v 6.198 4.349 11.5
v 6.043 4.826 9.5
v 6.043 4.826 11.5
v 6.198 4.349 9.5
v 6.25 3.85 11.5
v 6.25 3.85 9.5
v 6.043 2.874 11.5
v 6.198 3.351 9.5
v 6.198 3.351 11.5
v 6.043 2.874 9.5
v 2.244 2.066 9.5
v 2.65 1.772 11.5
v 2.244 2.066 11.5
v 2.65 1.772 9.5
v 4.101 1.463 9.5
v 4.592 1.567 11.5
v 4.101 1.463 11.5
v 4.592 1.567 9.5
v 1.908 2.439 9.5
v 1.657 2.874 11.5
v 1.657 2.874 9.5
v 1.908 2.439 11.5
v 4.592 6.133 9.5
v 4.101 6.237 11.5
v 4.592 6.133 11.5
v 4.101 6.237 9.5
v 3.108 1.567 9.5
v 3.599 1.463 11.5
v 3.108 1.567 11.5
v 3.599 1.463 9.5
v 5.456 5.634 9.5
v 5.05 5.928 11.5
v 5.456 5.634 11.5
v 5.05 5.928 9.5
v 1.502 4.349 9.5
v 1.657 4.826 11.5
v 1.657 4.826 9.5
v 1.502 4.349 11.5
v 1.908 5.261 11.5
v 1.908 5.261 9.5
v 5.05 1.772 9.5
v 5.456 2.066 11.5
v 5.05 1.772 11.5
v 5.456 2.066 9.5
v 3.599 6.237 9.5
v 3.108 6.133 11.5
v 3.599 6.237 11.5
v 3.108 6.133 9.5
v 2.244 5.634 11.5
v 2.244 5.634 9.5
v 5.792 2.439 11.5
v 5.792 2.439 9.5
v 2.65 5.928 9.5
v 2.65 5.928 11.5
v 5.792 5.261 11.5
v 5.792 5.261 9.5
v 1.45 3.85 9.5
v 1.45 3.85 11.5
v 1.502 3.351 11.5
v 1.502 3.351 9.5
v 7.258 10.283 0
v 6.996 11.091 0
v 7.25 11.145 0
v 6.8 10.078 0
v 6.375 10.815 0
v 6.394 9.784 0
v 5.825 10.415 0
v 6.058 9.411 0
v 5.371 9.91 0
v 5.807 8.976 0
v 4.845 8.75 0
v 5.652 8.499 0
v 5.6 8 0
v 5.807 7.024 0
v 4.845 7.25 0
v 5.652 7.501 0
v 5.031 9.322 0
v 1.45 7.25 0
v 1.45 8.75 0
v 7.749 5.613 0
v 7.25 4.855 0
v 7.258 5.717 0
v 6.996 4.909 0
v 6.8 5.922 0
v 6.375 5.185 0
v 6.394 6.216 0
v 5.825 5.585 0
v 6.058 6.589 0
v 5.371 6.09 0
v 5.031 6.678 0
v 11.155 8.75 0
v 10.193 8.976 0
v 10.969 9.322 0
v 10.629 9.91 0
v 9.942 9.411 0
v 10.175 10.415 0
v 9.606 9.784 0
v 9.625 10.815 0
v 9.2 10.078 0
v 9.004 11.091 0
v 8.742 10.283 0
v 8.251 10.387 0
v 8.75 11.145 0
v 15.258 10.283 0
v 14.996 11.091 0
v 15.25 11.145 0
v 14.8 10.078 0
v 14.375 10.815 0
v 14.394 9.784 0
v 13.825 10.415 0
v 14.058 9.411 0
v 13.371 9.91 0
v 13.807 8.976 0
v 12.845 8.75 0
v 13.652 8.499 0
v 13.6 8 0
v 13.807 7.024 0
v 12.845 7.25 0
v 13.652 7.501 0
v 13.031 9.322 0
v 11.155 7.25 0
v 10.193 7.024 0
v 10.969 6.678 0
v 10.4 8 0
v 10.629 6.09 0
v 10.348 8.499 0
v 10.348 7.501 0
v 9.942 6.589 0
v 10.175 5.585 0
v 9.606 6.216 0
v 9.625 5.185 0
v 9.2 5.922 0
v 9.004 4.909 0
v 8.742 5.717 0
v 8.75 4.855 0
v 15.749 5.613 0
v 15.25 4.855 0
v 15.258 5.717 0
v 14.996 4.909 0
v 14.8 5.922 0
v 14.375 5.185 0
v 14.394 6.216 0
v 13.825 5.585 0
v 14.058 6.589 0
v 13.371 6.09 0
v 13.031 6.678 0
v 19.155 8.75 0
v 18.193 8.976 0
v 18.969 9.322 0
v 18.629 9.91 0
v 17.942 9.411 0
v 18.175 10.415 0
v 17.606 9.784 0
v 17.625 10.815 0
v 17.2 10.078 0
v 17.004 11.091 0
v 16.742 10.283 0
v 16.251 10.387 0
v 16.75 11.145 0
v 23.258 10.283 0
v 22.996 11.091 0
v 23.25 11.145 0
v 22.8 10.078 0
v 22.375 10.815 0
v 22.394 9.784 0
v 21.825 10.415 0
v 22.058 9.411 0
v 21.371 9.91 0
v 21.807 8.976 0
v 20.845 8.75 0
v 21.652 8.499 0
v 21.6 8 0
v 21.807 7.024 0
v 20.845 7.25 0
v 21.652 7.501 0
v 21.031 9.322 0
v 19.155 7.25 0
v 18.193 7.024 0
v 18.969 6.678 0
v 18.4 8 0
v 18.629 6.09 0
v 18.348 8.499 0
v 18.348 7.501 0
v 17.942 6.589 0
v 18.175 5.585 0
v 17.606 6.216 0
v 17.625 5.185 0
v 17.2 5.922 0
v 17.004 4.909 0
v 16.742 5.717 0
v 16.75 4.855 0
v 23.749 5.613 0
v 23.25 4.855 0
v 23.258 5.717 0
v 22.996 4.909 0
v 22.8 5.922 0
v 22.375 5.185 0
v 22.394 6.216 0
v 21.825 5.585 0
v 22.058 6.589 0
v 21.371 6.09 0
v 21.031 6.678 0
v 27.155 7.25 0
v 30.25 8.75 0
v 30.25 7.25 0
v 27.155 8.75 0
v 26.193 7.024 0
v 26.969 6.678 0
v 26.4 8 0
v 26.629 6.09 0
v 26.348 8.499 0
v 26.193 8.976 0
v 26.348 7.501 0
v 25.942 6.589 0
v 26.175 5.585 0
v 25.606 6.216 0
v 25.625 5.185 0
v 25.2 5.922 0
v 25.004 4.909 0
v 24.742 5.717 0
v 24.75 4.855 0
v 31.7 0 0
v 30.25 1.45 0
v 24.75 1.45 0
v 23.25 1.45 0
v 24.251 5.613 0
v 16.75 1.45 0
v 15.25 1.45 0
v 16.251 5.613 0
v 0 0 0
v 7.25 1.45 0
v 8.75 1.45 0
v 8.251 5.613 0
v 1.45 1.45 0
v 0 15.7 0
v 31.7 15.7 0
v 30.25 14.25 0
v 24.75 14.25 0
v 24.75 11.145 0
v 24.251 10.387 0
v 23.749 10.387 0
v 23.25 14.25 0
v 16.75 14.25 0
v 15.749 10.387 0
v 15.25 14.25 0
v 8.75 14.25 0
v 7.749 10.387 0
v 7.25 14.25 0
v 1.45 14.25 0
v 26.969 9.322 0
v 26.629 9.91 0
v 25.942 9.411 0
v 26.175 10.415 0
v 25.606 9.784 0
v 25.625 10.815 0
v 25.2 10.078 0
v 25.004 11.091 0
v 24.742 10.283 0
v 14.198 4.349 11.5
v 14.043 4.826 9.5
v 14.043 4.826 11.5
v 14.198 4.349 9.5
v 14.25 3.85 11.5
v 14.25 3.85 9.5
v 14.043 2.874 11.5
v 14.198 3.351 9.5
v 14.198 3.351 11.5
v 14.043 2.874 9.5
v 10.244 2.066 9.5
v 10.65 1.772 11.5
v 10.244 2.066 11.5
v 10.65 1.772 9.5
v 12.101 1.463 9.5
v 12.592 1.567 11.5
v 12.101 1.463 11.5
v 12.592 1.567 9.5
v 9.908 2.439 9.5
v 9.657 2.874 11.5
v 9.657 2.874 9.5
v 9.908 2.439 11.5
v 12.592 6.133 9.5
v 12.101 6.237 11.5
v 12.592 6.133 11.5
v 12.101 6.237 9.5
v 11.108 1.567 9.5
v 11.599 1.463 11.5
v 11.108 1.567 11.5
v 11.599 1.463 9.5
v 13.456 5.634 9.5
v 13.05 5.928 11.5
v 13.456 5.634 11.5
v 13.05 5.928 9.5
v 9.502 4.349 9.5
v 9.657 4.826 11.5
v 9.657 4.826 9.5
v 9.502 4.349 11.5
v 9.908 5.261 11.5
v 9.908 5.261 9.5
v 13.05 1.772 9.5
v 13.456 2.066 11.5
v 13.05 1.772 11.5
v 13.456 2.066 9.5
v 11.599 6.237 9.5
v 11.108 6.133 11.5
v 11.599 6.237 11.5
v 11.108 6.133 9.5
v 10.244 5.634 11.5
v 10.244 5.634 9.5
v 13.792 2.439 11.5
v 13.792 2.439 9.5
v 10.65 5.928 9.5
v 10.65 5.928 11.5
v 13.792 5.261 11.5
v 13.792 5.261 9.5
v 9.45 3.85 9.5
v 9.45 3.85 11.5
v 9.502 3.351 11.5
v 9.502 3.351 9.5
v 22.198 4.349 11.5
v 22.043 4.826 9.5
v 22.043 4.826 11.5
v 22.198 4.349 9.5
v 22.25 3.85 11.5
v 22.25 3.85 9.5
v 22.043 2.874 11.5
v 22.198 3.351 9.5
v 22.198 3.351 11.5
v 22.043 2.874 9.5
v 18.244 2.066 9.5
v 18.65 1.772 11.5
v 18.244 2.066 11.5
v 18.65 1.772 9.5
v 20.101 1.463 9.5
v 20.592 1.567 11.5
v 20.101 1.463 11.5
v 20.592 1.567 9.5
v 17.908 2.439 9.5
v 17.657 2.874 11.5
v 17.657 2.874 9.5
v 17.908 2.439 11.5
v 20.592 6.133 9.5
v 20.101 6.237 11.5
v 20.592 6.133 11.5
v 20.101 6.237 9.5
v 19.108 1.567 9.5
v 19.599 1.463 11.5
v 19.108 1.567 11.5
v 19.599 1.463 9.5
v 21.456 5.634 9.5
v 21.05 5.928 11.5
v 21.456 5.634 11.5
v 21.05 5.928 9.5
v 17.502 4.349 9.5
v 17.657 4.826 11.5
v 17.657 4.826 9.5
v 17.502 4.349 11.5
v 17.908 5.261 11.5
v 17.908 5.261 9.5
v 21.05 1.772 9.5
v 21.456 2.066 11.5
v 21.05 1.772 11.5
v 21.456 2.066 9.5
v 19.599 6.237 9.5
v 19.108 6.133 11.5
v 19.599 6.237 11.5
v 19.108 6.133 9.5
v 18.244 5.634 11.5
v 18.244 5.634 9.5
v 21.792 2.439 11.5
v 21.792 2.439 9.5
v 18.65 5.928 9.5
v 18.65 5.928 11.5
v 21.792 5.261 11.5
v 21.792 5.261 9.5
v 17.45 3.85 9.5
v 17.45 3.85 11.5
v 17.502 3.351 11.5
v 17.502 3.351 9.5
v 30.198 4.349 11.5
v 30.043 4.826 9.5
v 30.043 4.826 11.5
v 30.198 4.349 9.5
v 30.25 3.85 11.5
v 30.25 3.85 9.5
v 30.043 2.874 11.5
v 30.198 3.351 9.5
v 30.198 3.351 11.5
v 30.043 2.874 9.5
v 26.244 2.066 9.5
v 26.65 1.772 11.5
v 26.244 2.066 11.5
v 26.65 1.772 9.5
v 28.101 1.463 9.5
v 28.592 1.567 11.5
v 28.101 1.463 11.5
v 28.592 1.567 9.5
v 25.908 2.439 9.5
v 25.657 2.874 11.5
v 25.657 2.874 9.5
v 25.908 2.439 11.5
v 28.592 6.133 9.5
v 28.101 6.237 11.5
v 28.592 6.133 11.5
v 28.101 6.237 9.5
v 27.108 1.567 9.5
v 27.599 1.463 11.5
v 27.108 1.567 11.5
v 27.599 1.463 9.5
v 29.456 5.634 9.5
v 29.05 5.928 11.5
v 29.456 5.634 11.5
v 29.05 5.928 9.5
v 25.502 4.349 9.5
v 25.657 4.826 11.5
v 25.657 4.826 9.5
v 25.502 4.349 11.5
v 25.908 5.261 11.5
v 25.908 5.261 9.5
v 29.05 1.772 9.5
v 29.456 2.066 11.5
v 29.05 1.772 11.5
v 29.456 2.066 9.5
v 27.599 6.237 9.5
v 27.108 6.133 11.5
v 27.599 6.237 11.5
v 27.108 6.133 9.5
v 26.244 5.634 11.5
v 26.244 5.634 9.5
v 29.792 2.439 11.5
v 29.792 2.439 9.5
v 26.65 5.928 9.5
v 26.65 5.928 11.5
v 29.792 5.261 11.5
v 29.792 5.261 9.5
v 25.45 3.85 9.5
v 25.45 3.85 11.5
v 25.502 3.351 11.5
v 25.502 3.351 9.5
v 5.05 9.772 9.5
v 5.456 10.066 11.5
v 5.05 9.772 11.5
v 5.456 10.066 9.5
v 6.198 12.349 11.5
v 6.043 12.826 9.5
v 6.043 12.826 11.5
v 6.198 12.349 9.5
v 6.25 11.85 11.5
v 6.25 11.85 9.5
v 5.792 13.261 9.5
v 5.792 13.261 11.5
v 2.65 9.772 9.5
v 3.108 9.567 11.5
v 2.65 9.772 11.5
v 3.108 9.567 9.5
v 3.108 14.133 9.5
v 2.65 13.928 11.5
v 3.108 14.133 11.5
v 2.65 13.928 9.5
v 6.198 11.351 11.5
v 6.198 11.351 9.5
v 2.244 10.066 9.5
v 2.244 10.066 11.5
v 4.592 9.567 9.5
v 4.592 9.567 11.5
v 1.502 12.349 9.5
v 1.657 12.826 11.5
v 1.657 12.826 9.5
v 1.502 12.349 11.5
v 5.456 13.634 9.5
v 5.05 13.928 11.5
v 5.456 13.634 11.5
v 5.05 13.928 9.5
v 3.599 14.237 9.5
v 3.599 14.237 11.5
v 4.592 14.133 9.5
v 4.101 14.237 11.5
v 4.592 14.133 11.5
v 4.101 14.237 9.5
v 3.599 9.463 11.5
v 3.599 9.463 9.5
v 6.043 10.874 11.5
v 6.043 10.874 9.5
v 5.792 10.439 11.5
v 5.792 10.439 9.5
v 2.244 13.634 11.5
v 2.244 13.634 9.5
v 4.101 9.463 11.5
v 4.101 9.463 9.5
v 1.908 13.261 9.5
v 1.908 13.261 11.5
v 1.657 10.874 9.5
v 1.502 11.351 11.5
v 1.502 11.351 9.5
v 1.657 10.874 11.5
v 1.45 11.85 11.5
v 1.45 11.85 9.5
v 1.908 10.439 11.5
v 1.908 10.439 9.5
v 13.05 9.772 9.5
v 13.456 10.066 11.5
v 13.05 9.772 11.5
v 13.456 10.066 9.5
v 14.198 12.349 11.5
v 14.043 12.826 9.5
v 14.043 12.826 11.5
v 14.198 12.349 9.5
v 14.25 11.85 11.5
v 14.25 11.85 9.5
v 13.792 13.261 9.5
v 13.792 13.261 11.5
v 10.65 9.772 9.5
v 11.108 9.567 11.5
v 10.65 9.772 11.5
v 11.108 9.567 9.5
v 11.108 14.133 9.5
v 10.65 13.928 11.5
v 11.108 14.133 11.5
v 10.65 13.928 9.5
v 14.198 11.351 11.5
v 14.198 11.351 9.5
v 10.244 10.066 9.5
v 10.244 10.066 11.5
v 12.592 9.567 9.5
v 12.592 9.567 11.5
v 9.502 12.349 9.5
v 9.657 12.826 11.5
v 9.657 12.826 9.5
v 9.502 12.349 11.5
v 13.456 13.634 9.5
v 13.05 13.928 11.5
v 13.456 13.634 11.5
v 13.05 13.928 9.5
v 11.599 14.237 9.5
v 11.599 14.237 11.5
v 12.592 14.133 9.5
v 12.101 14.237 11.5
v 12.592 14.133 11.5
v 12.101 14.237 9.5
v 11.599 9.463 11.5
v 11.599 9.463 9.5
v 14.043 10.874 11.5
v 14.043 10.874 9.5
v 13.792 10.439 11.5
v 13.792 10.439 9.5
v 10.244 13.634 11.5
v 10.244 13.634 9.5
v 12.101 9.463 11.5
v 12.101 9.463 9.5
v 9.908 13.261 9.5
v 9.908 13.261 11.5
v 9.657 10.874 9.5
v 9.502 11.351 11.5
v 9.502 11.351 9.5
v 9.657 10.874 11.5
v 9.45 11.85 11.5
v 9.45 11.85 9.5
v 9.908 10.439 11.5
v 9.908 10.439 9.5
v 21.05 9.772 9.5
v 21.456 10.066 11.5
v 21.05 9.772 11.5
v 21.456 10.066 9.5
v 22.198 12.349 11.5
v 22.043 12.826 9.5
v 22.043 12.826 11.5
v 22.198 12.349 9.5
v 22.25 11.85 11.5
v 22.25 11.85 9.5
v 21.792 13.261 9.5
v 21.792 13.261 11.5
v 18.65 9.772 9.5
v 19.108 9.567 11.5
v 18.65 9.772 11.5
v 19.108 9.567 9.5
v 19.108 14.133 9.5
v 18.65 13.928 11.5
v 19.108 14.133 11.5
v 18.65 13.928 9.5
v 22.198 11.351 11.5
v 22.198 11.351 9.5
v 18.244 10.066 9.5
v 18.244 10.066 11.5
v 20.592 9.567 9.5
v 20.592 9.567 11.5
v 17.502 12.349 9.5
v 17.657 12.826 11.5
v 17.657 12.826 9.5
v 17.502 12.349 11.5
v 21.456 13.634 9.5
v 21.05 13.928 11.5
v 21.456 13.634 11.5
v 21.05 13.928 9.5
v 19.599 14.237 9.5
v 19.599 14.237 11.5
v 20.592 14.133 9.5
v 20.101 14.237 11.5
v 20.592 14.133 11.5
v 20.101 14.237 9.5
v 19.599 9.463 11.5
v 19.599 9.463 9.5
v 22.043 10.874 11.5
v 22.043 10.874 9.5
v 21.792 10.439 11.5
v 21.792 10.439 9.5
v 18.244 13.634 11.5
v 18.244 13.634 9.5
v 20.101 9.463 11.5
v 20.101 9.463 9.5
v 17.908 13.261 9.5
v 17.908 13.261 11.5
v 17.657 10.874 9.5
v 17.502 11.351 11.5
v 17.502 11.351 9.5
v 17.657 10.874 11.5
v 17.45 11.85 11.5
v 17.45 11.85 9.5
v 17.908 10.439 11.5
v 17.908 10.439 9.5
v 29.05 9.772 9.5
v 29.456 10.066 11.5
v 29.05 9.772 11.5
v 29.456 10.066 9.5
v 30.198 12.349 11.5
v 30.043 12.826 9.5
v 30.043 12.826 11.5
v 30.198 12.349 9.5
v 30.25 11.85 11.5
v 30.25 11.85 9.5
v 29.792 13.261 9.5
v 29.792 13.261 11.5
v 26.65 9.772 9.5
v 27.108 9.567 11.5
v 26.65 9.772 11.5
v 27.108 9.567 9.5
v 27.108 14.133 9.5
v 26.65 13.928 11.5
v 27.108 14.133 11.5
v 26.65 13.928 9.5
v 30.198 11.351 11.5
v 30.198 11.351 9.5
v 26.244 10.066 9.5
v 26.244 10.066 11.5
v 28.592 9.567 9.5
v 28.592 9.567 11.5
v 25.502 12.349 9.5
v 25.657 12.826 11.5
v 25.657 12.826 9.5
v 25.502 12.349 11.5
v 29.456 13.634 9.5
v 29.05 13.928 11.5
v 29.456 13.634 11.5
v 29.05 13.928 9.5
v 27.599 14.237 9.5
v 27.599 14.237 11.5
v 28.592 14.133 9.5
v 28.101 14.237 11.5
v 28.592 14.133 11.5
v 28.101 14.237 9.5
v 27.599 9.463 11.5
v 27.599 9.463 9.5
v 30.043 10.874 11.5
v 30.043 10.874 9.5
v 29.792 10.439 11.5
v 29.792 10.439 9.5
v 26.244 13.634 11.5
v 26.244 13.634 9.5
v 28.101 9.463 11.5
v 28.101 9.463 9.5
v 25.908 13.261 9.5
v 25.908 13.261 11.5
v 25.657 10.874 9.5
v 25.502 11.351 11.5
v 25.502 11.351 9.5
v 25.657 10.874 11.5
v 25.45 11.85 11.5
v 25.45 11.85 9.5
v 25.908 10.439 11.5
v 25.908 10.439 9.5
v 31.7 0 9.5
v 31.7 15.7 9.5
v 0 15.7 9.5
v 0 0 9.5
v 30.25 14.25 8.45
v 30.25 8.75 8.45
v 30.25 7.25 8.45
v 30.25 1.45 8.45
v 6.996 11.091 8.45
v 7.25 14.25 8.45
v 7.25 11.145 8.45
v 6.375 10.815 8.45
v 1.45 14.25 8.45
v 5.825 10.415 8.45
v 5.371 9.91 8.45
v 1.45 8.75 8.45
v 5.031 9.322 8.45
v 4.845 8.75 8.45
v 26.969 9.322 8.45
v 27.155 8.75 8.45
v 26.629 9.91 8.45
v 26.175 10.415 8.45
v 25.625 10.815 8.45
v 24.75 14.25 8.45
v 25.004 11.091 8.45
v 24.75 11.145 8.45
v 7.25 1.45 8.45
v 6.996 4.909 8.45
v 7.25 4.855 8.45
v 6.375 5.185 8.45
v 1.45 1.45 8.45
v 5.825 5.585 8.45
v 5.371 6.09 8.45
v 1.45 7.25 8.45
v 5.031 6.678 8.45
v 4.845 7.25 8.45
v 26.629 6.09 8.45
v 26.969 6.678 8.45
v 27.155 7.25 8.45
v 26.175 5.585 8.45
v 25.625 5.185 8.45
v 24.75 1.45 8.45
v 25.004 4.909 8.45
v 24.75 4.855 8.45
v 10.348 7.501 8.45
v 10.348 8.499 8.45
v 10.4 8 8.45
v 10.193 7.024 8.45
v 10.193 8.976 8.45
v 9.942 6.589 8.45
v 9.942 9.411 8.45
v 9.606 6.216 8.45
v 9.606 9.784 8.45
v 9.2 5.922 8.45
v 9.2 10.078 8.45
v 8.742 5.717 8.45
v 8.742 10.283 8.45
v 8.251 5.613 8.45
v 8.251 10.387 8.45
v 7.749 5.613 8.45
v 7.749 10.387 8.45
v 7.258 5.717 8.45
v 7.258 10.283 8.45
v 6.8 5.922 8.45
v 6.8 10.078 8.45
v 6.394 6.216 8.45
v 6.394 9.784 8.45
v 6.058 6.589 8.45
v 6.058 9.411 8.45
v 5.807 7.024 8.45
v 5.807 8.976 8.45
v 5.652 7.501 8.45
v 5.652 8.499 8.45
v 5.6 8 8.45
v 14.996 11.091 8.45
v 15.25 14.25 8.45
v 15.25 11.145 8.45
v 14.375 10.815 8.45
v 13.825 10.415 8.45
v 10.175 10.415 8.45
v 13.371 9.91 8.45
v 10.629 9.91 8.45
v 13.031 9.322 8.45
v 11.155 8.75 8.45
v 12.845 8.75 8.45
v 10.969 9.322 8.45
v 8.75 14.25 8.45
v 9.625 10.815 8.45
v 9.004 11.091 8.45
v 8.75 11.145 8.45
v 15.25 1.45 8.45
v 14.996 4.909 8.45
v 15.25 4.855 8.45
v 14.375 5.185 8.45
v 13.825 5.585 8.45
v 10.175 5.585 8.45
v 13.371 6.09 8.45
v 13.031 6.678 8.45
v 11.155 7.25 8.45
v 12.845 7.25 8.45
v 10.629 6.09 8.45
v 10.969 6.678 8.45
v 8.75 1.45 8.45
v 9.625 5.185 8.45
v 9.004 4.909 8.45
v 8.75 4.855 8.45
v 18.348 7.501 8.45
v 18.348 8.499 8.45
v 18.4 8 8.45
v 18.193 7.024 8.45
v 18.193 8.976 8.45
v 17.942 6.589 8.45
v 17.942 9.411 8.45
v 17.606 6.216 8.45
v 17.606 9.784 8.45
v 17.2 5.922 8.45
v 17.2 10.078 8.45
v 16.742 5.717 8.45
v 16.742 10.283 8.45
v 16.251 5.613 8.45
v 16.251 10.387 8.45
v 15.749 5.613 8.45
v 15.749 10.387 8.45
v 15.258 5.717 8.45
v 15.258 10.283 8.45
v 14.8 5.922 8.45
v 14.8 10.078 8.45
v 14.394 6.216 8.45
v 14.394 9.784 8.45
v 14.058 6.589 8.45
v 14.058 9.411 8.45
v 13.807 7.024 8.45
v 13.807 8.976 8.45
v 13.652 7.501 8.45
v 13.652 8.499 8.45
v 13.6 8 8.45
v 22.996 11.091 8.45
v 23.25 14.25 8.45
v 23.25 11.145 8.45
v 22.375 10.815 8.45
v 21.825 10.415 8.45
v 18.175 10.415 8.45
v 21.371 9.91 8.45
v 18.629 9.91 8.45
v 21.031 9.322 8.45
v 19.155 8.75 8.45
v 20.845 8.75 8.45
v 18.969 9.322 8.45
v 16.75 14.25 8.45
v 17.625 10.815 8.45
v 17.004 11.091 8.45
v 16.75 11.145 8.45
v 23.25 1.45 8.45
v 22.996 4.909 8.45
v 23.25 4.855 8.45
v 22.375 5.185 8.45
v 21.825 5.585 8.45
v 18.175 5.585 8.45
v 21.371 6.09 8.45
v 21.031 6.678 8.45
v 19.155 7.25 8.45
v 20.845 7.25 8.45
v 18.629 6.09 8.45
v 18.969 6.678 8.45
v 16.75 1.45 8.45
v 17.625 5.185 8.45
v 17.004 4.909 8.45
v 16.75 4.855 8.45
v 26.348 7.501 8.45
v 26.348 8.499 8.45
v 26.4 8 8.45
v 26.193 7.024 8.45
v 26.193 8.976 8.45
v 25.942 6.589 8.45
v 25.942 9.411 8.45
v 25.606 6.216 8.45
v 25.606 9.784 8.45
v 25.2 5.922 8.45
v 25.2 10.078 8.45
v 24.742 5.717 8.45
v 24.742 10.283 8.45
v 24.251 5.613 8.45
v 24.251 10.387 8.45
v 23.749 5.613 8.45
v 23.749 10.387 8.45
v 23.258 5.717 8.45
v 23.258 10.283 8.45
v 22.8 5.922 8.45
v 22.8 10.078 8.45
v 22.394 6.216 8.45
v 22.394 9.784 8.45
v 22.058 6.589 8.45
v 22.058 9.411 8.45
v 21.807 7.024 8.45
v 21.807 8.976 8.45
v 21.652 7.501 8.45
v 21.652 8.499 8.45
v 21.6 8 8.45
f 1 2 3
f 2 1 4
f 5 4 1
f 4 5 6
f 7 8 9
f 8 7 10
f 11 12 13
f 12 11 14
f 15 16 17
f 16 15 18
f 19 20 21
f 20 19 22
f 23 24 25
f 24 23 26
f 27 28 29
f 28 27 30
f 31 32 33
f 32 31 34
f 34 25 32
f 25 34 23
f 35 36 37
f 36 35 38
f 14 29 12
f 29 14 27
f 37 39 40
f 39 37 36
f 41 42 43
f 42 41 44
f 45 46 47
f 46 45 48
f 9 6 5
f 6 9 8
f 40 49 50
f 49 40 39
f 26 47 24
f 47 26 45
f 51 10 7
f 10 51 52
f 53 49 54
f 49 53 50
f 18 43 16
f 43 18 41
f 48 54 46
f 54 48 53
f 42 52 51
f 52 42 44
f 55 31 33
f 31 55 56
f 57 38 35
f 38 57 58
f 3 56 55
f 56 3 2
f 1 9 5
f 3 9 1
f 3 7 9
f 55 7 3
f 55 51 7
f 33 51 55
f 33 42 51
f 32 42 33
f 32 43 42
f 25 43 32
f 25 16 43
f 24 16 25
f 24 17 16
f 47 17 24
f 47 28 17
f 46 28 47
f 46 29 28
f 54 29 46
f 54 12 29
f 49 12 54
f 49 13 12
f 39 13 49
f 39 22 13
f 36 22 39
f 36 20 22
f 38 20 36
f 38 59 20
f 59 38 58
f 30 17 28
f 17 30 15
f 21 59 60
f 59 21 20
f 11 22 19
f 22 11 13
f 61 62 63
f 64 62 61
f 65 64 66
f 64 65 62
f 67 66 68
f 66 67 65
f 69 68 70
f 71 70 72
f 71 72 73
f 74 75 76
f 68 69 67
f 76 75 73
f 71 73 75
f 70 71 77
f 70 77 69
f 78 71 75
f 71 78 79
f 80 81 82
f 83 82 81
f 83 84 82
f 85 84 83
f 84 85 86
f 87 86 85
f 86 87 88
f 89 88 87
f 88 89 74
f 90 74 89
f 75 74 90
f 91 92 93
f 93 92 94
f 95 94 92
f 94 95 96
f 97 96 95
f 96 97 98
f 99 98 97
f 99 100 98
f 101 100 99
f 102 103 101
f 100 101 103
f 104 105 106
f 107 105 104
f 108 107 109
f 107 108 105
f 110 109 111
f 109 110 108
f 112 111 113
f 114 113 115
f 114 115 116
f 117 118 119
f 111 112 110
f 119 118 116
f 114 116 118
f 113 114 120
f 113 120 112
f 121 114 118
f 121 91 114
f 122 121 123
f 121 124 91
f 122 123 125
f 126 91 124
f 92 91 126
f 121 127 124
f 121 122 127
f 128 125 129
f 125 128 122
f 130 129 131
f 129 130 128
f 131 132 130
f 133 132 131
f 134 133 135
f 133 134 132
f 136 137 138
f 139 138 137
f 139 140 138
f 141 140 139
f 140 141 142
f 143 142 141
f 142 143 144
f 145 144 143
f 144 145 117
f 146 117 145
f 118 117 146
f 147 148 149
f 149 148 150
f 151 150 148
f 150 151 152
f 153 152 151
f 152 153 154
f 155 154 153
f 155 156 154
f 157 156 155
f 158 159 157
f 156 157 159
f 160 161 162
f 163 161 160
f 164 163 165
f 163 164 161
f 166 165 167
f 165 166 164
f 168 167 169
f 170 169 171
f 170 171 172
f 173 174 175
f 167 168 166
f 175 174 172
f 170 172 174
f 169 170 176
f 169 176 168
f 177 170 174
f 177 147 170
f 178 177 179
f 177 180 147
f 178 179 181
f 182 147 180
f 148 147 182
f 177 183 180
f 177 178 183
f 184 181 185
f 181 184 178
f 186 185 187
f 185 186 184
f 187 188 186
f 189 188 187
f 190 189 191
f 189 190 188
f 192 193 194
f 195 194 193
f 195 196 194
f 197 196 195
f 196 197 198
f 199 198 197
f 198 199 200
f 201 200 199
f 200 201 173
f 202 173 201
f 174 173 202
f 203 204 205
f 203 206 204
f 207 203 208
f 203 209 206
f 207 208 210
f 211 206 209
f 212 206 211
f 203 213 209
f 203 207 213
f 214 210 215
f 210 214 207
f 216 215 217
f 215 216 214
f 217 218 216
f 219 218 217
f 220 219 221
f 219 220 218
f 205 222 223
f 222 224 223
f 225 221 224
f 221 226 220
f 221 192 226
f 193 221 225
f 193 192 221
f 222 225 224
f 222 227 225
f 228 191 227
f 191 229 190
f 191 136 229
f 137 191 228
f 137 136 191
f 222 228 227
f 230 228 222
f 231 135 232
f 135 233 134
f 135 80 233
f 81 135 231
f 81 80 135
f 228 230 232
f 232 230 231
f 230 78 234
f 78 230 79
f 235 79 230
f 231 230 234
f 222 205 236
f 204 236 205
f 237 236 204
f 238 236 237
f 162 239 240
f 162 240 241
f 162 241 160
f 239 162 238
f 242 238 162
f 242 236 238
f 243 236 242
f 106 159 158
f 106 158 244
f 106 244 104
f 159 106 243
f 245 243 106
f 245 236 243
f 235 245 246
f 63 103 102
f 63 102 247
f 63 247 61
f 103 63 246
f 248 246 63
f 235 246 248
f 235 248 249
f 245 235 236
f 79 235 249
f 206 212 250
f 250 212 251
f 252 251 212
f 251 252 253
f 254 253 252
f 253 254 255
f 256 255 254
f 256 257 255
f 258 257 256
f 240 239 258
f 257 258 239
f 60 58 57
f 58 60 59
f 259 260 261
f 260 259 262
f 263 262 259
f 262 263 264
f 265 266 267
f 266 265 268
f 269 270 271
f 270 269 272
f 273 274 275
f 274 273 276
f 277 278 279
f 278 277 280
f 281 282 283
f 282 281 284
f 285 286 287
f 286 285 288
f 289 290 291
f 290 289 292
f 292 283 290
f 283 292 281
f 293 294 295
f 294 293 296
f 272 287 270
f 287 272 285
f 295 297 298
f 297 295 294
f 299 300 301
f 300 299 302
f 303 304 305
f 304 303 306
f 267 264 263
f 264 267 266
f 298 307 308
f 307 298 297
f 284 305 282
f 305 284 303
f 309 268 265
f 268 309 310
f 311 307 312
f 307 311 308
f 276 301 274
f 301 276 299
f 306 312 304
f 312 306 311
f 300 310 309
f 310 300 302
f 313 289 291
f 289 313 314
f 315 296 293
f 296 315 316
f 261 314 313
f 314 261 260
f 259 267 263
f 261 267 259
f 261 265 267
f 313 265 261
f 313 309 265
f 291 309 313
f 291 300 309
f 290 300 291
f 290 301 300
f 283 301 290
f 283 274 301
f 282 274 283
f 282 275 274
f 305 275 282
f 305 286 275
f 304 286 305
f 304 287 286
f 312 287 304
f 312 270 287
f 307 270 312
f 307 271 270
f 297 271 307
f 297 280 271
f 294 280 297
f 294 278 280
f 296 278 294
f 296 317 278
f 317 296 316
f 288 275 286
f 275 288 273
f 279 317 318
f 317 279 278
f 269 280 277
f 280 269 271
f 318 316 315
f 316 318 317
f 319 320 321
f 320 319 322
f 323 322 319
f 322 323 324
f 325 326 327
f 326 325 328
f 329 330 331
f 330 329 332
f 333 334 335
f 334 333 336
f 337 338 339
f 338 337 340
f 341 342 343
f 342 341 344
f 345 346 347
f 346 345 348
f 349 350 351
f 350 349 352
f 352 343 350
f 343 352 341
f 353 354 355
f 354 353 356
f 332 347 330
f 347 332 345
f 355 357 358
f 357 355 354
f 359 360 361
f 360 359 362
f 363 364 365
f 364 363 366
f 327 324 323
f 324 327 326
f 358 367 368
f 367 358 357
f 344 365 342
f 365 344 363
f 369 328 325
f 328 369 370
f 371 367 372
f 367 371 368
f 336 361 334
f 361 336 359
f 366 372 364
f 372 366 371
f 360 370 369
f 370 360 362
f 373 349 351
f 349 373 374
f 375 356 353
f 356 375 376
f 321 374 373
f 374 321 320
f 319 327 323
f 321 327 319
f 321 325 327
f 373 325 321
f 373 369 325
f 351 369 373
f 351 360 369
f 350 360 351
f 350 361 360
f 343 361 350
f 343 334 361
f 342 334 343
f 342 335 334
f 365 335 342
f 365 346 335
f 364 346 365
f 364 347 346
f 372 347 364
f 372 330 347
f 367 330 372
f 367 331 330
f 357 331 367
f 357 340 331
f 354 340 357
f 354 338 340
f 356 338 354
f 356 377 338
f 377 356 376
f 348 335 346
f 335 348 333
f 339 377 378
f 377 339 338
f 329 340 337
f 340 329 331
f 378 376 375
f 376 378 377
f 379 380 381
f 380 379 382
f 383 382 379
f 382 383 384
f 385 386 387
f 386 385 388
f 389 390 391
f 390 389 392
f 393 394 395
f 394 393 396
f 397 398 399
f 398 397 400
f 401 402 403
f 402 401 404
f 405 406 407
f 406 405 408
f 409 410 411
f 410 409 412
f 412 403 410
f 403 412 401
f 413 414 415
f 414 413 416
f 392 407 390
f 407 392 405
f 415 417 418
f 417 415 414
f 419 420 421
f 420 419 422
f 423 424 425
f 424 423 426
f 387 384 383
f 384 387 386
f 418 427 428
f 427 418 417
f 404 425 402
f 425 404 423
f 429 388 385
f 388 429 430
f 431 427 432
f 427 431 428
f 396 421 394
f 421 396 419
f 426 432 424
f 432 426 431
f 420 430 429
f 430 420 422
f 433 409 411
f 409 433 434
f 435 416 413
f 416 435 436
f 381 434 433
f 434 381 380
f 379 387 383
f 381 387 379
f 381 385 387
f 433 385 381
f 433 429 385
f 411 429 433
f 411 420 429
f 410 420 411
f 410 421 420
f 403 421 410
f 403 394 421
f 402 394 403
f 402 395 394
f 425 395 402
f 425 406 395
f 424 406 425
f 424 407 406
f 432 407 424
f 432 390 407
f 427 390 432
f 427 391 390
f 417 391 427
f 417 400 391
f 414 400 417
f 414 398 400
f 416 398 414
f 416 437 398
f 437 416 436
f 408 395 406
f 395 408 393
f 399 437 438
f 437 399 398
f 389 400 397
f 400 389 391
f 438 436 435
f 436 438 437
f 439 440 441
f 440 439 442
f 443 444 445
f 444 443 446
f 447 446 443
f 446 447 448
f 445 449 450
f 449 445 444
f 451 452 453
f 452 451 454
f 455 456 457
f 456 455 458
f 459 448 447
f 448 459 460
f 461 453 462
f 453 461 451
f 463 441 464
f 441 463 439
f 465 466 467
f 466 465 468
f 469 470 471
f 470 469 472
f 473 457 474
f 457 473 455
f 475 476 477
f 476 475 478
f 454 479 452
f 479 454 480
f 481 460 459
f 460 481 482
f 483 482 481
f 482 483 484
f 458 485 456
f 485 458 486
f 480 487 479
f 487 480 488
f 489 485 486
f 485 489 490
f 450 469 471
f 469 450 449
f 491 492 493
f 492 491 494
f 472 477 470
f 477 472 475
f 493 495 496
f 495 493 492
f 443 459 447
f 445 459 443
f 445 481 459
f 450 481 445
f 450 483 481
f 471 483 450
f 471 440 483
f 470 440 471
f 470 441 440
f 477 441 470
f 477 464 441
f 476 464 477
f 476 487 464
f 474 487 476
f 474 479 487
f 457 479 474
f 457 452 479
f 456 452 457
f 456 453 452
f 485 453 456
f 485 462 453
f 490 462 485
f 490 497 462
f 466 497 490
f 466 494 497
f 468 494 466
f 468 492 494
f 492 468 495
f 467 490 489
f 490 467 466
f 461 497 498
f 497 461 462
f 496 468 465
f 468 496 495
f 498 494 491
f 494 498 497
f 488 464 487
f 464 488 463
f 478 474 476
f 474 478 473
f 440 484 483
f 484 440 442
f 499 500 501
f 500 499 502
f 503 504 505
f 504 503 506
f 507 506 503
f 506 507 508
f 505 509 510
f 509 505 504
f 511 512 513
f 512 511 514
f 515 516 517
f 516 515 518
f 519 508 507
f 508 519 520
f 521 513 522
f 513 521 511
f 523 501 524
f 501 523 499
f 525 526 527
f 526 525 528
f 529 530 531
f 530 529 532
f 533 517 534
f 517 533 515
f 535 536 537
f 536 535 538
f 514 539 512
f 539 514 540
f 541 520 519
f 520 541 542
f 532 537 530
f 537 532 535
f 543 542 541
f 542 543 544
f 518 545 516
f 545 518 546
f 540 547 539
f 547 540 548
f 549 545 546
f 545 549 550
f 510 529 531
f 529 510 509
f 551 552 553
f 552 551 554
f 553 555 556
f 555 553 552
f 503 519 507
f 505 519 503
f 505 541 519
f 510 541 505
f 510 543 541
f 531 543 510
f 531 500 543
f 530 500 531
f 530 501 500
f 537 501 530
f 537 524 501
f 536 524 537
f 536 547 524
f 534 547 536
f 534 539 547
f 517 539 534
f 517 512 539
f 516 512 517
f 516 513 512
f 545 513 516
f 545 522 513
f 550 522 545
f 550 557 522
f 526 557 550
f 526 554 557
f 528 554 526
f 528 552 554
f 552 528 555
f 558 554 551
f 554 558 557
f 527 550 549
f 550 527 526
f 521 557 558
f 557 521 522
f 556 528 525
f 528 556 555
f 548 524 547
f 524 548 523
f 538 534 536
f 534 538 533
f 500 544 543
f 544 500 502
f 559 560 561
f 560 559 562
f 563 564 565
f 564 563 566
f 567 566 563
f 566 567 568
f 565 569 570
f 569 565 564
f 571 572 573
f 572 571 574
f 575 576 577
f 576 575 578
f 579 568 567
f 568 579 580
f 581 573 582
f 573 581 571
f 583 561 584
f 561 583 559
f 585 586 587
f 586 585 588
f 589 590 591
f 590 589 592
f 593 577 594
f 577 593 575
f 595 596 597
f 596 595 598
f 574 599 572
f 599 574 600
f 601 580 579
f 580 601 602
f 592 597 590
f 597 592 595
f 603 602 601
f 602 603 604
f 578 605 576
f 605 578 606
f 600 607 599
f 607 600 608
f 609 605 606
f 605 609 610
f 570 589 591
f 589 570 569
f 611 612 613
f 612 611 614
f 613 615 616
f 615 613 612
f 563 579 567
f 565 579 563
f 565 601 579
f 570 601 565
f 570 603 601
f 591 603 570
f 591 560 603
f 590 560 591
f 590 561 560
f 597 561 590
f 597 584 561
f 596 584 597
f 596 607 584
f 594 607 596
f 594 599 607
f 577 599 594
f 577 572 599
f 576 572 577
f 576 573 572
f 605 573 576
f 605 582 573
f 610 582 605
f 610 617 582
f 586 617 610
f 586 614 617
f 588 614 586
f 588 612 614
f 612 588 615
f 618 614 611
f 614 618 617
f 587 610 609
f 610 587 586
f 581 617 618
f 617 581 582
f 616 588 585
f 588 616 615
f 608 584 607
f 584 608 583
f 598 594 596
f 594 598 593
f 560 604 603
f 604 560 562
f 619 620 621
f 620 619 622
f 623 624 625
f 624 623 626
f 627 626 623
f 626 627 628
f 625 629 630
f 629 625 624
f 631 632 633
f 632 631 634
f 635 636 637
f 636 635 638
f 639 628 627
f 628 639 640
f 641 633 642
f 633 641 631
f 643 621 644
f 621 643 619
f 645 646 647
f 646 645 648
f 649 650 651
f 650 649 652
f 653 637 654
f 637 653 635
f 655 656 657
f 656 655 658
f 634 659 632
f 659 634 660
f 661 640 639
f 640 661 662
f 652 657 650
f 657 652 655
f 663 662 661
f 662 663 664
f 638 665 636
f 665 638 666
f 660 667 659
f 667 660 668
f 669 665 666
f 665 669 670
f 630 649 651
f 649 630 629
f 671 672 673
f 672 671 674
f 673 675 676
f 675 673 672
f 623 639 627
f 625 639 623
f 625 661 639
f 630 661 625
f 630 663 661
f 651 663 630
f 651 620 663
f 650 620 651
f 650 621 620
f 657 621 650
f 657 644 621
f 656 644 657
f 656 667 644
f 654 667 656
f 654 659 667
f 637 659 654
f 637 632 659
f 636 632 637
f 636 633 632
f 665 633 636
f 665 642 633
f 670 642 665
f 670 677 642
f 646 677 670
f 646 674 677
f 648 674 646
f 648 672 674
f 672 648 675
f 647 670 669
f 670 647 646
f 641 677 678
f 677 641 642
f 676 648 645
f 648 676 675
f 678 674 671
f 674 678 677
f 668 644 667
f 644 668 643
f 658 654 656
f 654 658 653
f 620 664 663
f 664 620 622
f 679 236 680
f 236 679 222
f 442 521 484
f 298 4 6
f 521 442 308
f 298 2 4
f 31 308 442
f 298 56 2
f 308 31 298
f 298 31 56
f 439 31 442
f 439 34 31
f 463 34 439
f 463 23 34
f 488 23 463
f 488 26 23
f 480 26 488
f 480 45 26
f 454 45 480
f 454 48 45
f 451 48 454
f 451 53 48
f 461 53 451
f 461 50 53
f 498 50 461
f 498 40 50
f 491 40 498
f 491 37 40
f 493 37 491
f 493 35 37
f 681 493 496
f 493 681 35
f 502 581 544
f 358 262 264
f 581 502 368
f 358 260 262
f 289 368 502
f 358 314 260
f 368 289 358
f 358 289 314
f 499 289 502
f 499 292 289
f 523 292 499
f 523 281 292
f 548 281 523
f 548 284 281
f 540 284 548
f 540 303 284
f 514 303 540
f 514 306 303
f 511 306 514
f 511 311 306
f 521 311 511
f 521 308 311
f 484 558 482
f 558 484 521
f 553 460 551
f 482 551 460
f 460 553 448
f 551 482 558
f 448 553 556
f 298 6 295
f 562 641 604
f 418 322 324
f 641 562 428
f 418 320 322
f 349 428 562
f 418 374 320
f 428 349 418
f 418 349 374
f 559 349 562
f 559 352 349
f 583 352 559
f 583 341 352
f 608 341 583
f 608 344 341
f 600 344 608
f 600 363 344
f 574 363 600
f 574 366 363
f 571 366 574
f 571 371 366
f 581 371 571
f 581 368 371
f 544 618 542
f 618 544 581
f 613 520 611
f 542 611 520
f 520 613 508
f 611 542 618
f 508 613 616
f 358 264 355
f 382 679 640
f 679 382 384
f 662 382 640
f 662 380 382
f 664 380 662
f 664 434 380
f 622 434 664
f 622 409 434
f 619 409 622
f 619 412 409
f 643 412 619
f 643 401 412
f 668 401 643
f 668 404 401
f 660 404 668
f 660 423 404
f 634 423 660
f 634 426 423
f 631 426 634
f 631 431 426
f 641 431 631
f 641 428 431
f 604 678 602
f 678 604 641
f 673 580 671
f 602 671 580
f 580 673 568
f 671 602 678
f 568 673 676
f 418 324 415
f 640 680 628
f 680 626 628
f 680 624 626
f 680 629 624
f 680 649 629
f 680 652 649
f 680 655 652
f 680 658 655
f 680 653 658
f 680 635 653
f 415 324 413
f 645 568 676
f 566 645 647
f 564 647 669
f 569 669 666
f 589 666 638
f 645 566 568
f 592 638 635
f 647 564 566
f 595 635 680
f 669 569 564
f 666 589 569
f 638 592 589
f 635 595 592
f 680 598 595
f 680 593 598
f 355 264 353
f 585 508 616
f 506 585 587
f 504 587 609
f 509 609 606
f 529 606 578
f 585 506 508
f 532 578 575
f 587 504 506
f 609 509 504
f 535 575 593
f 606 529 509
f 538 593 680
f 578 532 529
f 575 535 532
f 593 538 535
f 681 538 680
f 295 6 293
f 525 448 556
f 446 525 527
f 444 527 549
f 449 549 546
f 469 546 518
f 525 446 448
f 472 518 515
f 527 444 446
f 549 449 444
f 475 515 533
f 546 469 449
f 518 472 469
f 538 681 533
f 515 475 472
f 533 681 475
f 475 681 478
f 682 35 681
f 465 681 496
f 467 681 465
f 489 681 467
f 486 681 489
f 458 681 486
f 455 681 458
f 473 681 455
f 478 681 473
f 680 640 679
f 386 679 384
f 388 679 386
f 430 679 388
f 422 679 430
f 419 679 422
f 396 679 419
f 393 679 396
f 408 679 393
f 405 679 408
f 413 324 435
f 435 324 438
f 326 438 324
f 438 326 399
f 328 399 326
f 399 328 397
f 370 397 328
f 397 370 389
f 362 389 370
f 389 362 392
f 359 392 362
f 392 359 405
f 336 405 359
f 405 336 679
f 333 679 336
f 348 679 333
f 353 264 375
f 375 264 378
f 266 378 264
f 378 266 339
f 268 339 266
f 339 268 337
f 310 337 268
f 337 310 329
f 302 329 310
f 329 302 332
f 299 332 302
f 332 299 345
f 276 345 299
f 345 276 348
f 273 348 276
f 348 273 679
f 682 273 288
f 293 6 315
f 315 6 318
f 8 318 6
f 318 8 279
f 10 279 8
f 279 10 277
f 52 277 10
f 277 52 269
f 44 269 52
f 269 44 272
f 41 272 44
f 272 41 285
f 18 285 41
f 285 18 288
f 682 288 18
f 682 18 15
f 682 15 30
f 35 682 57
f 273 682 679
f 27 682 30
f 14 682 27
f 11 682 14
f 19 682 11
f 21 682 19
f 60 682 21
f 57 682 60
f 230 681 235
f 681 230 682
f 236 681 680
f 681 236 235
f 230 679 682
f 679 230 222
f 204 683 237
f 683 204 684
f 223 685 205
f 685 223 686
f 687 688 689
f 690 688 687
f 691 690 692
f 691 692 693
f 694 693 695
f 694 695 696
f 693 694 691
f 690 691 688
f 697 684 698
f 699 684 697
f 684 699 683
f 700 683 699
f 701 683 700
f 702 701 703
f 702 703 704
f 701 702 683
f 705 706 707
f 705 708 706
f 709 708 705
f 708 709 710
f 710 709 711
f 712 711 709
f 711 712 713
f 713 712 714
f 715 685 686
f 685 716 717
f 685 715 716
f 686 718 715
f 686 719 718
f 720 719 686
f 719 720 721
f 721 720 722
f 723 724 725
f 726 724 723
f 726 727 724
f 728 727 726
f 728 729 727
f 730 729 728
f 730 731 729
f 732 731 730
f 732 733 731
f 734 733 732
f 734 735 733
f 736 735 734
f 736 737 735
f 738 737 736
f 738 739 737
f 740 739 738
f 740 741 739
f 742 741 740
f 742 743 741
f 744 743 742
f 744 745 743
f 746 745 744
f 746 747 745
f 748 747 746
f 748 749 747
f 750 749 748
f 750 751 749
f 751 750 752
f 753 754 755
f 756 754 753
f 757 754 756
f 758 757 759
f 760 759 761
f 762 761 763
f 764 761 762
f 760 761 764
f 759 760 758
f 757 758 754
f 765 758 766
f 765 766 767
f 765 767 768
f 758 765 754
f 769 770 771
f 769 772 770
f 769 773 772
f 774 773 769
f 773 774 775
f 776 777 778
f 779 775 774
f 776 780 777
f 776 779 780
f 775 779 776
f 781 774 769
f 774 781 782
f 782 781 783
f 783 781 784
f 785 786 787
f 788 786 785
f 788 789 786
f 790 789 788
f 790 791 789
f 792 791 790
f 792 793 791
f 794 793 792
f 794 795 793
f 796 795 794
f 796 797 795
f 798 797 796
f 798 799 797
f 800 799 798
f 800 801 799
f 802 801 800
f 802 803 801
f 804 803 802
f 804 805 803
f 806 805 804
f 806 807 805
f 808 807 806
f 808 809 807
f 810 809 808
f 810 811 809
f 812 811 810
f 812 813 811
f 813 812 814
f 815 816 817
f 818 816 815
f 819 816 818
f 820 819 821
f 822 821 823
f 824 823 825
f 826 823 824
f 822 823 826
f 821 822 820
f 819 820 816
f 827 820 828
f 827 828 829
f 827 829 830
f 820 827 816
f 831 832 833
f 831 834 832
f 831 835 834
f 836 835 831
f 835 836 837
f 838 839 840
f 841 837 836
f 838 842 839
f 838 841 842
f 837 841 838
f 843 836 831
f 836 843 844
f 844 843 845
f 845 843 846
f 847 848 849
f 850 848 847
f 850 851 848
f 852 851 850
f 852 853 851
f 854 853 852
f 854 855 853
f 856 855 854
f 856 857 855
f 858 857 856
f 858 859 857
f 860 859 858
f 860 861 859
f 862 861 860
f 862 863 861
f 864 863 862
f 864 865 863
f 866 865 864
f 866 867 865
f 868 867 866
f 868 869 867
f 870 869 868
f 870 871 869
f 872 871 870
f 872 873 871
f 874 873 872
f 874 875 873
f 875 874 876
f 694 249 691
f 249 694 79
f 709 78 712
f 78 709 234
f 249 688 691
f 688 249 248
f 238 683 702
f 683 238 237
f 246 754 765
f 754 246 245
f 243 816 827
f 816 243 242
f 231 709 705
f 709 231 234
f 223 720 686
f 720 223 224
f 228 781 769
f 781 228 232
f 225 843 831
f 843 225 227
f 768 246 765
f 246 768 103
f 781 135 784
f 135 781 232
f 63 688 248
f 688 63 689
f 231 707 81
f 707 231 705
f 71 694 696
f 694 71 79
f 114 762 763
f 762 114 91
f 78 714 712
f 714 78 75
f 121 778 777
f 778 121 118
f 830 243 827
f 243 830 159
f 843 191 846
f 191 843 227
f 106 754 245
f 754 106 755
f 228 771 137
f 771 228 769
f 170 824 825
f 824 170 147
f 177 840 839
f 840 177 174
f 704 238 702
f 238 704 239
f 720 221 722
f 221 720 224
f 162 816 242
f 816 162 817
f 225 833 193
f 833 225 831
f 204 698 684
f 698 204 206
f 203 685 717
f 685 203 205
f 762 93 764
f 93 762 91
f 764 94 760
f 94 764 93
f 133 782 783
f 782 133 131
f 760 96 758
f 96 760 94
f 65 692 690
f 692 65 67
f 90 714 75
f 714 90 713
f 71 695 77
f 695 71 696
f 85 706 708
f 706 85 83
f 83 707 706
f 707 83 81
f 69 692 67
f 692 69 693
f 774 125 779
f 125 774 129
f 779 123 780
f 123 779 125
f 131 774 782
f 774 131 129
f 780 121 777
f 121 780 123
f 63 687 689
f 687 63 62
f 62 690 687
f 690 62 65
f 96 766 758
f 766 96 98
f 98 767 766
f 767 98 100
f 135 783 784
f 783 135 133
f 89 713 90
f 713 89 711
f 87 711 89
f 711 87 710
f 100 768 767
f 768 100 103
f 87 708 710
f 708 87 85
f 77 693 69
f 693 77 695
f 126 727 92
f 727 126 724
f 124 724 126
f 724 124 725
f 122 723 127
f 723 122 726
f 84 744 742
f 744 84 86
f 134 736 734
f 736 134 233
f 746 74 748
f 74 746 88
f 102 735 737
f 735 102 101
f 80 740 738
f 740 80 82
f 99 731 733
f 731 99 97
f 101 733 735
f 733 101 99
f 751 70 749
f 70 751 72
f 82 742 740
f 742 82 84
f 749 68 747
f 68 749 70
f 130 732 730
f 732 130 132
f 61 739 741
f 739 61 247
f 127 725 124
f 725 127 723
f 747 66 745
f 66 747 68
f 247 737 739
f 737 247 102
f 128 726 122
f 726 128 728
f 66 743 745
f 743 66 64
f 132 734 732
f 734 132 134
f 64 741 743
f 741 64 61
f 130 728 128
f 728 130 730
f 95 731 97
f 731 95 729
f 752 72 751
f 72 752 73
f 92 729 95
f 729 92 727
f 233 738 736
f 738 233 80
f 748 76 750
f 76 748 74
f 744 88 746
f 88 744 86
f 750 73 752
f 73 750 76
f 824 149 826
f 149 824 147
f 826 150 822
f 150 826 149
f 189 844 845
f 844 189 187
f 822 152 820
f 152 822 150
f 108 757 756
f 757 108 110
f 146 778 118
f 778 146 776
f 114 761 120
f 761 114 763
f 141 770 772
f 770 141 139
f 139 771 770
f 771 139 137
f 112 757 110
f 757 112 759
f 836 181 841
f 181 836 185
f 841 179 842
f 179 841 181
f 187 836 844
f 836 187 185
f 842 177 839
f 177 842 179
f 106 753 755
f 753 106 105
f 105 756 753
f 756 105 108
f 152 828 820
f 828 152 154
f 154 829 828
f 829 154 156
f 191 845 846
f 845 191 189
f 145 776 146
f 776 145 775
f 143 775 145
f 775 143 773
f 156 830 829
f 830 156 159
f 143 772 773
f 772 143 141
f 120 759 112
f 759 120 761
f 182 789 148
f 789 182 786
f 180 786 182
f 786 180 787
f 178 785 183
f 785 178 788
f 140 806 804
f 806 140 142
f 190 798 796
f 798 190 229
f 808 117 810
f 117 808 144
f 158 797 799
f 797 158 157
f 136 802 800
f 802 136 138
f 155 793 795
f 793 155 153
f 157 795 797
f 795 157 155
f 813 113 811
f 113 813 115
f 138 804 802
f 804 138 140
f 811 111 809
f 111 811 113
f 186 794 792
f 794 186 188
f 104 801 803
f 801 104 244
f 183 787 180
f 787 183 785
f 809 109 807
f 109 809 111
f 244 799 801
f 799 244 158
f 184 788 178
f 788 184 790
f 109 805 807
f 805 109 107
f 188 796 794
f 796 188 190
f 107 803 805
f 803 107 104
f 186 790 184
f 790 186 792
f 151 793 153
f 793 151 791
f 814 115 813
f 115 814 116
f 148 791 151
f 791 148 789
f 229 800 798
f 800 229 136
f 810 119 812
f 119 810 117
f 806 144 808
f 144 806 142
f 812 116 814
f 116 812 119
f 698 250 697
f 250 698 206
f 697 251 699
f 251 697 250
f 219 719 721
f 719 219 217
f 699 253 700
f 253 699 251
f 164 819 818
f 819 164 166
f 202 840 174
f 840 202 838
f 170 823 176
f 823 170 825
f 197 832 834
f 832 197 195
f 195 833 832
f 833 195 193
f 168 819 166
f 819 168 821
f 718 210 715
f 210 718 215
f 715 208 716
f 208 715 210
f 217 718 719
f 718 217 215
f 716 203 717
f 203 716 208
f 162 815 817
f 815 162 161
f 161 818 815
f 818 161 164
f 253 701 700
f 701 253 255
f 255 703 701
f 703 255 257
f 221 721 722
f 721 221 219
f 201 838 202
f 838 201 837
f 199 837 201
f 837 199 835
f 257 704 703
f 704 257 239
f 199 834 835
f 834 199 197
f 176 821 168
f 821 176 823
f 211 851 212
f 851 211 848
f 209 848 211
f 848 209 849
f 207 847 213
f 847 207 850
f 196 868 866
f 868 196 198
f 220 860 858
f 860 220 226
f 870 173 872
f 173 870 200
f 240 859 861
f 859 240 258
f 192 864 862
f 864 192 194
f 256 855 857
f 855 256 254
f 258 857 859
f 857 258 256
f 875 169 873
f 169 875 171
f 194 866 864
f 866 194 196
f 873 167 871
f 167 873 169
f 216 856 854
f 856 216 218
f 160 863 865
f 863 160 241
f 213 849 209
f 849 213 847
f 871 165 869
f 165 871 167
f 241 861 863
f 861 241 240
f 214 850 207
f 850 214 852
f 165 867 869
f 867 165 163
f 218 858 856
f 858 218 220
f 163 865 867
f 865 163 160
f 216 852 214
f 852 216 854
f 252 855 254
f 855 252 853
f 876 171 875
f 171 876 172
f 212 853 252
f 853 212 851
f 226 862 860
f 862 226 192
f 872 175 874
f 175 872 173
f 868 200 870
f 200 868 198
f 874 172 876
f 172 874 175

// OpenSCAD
//Edited 2/14/2013
//Based off of jag's design
//Adapted by Adam Zeloof (azzeloof)


Block_Width = 4;

Block_Length = 2; 

Block_Height = 1;

// knob_diameter=4.8;		//knobs on top of blocks
// knob_height=2;
// knob_spacing=8.0;
// wall_thickness=1.45;
// roof_thickness=1.05;
// block_height=9.5;
// pin_diameter=3;		//pin for bottom blocks with width or length of 1
// post_diameter=6.5;
// reinforcing_width=1.5;
// axle_spline_width=2.0;
// axle_diameter=9.5;


block(Block_Length,Block_Width,Block_Height,axle_hole=false,reinforcement=true);

module block(width,length,height,axle_hole,reinforcement) {
	overall_length=(length-1)*8+4.8+1.45*2;
	overall_width=(width-1)*8+4.8+1.45*2;
	union() {
		difference() {
			union() {
				cube([overall_length,overall_width,height*9.5]);
				translate([4.8/2+1.45,4.8/2+1.45,0]) 
					for (ycount=[0:width-1])
						for (xcount=[0:length-1]) {
							translate([xcount*8,ycount*8,0])
								cylinder(r=4.8/2,h=9.5*height+2,$fs=.1);
					}
			}
			translate([1.45,1.45,-1.05]) cube([overall_length-1.45*2,overall_width-1.45*2,9.5*height]);
			if (axle_hole==true)
				if (width>1 && length>1) for (ycount=[1:width-1])
					for (xcount=[1:length-1])
						translate([xcount*8,ycount*8,-9.5/2])  axle(height+1);
		}

		if (reinforcement==true && width>1 && length>1)
			difference() {
				for (ycount=[1:width-1])
					for (xcount=[1:length-1])
						translate([xcount*8,ycount*8,0]) reinforcement(height);
				for (ycount=[1:width-1])
					for (xcount=[1:length-1])
						translate([xcount*8,ycount*8,-0.5]) cylinder(r=6.5/2-0.1, h=height*9.5+0.5, $fs=.1);
			}

		if (width>1 && length>1) for (ycount=[1:width-1])
			for (xcount=[1:length-1])
				translate([xcount*8,ycount*8,0]) post(height,axle_hole);

		if (width==1 && length!=1)
			for (xcount=[1:length-1])
				translate([xcount*8,overall_width/2,0]) cylinder(r=3/2,h=9.5*height,$fs=.1);

		if (length==1 && width!=1)
			for (ycount=[1:width-1])
				translate([overall_length/2,ycount*8,0]) cylinder(r=3/2,h=9.5*height,$fs=.1);
	}
}

module post(height,axle_hole=false) {
	difference() {
		cylinder(r=6.5/2, h=height*9.5,$fs=.1);
		if (axle_hole==true) {
			translate([0,0,-block_height/2])
				axle(height+1);
		} else {
			translate([0,0,-0.5])
				cylinder(r=4.8/2, h=height*9.5+1,$fs=.1);
		}
	}
}

module reinforcement(height) {
	union() {
		translate([0,0,height*9.5/2]) union() {
			cube([1.5,8+4.8+1.45/2,height*9.5],center=true);
			rotate(v=[0,0,1],a=90) cube([1.5,8+4.8+1.45/2,height*9.5], center=true);
		}
	}
}

module axle(height) {
	translate([0,0,height*9.5/2]) union() {
		cube([9.5,2.0,height*9.5],center=true);
		cube([2.0,9.5,height*9.5],center=true);
	}
}
			
